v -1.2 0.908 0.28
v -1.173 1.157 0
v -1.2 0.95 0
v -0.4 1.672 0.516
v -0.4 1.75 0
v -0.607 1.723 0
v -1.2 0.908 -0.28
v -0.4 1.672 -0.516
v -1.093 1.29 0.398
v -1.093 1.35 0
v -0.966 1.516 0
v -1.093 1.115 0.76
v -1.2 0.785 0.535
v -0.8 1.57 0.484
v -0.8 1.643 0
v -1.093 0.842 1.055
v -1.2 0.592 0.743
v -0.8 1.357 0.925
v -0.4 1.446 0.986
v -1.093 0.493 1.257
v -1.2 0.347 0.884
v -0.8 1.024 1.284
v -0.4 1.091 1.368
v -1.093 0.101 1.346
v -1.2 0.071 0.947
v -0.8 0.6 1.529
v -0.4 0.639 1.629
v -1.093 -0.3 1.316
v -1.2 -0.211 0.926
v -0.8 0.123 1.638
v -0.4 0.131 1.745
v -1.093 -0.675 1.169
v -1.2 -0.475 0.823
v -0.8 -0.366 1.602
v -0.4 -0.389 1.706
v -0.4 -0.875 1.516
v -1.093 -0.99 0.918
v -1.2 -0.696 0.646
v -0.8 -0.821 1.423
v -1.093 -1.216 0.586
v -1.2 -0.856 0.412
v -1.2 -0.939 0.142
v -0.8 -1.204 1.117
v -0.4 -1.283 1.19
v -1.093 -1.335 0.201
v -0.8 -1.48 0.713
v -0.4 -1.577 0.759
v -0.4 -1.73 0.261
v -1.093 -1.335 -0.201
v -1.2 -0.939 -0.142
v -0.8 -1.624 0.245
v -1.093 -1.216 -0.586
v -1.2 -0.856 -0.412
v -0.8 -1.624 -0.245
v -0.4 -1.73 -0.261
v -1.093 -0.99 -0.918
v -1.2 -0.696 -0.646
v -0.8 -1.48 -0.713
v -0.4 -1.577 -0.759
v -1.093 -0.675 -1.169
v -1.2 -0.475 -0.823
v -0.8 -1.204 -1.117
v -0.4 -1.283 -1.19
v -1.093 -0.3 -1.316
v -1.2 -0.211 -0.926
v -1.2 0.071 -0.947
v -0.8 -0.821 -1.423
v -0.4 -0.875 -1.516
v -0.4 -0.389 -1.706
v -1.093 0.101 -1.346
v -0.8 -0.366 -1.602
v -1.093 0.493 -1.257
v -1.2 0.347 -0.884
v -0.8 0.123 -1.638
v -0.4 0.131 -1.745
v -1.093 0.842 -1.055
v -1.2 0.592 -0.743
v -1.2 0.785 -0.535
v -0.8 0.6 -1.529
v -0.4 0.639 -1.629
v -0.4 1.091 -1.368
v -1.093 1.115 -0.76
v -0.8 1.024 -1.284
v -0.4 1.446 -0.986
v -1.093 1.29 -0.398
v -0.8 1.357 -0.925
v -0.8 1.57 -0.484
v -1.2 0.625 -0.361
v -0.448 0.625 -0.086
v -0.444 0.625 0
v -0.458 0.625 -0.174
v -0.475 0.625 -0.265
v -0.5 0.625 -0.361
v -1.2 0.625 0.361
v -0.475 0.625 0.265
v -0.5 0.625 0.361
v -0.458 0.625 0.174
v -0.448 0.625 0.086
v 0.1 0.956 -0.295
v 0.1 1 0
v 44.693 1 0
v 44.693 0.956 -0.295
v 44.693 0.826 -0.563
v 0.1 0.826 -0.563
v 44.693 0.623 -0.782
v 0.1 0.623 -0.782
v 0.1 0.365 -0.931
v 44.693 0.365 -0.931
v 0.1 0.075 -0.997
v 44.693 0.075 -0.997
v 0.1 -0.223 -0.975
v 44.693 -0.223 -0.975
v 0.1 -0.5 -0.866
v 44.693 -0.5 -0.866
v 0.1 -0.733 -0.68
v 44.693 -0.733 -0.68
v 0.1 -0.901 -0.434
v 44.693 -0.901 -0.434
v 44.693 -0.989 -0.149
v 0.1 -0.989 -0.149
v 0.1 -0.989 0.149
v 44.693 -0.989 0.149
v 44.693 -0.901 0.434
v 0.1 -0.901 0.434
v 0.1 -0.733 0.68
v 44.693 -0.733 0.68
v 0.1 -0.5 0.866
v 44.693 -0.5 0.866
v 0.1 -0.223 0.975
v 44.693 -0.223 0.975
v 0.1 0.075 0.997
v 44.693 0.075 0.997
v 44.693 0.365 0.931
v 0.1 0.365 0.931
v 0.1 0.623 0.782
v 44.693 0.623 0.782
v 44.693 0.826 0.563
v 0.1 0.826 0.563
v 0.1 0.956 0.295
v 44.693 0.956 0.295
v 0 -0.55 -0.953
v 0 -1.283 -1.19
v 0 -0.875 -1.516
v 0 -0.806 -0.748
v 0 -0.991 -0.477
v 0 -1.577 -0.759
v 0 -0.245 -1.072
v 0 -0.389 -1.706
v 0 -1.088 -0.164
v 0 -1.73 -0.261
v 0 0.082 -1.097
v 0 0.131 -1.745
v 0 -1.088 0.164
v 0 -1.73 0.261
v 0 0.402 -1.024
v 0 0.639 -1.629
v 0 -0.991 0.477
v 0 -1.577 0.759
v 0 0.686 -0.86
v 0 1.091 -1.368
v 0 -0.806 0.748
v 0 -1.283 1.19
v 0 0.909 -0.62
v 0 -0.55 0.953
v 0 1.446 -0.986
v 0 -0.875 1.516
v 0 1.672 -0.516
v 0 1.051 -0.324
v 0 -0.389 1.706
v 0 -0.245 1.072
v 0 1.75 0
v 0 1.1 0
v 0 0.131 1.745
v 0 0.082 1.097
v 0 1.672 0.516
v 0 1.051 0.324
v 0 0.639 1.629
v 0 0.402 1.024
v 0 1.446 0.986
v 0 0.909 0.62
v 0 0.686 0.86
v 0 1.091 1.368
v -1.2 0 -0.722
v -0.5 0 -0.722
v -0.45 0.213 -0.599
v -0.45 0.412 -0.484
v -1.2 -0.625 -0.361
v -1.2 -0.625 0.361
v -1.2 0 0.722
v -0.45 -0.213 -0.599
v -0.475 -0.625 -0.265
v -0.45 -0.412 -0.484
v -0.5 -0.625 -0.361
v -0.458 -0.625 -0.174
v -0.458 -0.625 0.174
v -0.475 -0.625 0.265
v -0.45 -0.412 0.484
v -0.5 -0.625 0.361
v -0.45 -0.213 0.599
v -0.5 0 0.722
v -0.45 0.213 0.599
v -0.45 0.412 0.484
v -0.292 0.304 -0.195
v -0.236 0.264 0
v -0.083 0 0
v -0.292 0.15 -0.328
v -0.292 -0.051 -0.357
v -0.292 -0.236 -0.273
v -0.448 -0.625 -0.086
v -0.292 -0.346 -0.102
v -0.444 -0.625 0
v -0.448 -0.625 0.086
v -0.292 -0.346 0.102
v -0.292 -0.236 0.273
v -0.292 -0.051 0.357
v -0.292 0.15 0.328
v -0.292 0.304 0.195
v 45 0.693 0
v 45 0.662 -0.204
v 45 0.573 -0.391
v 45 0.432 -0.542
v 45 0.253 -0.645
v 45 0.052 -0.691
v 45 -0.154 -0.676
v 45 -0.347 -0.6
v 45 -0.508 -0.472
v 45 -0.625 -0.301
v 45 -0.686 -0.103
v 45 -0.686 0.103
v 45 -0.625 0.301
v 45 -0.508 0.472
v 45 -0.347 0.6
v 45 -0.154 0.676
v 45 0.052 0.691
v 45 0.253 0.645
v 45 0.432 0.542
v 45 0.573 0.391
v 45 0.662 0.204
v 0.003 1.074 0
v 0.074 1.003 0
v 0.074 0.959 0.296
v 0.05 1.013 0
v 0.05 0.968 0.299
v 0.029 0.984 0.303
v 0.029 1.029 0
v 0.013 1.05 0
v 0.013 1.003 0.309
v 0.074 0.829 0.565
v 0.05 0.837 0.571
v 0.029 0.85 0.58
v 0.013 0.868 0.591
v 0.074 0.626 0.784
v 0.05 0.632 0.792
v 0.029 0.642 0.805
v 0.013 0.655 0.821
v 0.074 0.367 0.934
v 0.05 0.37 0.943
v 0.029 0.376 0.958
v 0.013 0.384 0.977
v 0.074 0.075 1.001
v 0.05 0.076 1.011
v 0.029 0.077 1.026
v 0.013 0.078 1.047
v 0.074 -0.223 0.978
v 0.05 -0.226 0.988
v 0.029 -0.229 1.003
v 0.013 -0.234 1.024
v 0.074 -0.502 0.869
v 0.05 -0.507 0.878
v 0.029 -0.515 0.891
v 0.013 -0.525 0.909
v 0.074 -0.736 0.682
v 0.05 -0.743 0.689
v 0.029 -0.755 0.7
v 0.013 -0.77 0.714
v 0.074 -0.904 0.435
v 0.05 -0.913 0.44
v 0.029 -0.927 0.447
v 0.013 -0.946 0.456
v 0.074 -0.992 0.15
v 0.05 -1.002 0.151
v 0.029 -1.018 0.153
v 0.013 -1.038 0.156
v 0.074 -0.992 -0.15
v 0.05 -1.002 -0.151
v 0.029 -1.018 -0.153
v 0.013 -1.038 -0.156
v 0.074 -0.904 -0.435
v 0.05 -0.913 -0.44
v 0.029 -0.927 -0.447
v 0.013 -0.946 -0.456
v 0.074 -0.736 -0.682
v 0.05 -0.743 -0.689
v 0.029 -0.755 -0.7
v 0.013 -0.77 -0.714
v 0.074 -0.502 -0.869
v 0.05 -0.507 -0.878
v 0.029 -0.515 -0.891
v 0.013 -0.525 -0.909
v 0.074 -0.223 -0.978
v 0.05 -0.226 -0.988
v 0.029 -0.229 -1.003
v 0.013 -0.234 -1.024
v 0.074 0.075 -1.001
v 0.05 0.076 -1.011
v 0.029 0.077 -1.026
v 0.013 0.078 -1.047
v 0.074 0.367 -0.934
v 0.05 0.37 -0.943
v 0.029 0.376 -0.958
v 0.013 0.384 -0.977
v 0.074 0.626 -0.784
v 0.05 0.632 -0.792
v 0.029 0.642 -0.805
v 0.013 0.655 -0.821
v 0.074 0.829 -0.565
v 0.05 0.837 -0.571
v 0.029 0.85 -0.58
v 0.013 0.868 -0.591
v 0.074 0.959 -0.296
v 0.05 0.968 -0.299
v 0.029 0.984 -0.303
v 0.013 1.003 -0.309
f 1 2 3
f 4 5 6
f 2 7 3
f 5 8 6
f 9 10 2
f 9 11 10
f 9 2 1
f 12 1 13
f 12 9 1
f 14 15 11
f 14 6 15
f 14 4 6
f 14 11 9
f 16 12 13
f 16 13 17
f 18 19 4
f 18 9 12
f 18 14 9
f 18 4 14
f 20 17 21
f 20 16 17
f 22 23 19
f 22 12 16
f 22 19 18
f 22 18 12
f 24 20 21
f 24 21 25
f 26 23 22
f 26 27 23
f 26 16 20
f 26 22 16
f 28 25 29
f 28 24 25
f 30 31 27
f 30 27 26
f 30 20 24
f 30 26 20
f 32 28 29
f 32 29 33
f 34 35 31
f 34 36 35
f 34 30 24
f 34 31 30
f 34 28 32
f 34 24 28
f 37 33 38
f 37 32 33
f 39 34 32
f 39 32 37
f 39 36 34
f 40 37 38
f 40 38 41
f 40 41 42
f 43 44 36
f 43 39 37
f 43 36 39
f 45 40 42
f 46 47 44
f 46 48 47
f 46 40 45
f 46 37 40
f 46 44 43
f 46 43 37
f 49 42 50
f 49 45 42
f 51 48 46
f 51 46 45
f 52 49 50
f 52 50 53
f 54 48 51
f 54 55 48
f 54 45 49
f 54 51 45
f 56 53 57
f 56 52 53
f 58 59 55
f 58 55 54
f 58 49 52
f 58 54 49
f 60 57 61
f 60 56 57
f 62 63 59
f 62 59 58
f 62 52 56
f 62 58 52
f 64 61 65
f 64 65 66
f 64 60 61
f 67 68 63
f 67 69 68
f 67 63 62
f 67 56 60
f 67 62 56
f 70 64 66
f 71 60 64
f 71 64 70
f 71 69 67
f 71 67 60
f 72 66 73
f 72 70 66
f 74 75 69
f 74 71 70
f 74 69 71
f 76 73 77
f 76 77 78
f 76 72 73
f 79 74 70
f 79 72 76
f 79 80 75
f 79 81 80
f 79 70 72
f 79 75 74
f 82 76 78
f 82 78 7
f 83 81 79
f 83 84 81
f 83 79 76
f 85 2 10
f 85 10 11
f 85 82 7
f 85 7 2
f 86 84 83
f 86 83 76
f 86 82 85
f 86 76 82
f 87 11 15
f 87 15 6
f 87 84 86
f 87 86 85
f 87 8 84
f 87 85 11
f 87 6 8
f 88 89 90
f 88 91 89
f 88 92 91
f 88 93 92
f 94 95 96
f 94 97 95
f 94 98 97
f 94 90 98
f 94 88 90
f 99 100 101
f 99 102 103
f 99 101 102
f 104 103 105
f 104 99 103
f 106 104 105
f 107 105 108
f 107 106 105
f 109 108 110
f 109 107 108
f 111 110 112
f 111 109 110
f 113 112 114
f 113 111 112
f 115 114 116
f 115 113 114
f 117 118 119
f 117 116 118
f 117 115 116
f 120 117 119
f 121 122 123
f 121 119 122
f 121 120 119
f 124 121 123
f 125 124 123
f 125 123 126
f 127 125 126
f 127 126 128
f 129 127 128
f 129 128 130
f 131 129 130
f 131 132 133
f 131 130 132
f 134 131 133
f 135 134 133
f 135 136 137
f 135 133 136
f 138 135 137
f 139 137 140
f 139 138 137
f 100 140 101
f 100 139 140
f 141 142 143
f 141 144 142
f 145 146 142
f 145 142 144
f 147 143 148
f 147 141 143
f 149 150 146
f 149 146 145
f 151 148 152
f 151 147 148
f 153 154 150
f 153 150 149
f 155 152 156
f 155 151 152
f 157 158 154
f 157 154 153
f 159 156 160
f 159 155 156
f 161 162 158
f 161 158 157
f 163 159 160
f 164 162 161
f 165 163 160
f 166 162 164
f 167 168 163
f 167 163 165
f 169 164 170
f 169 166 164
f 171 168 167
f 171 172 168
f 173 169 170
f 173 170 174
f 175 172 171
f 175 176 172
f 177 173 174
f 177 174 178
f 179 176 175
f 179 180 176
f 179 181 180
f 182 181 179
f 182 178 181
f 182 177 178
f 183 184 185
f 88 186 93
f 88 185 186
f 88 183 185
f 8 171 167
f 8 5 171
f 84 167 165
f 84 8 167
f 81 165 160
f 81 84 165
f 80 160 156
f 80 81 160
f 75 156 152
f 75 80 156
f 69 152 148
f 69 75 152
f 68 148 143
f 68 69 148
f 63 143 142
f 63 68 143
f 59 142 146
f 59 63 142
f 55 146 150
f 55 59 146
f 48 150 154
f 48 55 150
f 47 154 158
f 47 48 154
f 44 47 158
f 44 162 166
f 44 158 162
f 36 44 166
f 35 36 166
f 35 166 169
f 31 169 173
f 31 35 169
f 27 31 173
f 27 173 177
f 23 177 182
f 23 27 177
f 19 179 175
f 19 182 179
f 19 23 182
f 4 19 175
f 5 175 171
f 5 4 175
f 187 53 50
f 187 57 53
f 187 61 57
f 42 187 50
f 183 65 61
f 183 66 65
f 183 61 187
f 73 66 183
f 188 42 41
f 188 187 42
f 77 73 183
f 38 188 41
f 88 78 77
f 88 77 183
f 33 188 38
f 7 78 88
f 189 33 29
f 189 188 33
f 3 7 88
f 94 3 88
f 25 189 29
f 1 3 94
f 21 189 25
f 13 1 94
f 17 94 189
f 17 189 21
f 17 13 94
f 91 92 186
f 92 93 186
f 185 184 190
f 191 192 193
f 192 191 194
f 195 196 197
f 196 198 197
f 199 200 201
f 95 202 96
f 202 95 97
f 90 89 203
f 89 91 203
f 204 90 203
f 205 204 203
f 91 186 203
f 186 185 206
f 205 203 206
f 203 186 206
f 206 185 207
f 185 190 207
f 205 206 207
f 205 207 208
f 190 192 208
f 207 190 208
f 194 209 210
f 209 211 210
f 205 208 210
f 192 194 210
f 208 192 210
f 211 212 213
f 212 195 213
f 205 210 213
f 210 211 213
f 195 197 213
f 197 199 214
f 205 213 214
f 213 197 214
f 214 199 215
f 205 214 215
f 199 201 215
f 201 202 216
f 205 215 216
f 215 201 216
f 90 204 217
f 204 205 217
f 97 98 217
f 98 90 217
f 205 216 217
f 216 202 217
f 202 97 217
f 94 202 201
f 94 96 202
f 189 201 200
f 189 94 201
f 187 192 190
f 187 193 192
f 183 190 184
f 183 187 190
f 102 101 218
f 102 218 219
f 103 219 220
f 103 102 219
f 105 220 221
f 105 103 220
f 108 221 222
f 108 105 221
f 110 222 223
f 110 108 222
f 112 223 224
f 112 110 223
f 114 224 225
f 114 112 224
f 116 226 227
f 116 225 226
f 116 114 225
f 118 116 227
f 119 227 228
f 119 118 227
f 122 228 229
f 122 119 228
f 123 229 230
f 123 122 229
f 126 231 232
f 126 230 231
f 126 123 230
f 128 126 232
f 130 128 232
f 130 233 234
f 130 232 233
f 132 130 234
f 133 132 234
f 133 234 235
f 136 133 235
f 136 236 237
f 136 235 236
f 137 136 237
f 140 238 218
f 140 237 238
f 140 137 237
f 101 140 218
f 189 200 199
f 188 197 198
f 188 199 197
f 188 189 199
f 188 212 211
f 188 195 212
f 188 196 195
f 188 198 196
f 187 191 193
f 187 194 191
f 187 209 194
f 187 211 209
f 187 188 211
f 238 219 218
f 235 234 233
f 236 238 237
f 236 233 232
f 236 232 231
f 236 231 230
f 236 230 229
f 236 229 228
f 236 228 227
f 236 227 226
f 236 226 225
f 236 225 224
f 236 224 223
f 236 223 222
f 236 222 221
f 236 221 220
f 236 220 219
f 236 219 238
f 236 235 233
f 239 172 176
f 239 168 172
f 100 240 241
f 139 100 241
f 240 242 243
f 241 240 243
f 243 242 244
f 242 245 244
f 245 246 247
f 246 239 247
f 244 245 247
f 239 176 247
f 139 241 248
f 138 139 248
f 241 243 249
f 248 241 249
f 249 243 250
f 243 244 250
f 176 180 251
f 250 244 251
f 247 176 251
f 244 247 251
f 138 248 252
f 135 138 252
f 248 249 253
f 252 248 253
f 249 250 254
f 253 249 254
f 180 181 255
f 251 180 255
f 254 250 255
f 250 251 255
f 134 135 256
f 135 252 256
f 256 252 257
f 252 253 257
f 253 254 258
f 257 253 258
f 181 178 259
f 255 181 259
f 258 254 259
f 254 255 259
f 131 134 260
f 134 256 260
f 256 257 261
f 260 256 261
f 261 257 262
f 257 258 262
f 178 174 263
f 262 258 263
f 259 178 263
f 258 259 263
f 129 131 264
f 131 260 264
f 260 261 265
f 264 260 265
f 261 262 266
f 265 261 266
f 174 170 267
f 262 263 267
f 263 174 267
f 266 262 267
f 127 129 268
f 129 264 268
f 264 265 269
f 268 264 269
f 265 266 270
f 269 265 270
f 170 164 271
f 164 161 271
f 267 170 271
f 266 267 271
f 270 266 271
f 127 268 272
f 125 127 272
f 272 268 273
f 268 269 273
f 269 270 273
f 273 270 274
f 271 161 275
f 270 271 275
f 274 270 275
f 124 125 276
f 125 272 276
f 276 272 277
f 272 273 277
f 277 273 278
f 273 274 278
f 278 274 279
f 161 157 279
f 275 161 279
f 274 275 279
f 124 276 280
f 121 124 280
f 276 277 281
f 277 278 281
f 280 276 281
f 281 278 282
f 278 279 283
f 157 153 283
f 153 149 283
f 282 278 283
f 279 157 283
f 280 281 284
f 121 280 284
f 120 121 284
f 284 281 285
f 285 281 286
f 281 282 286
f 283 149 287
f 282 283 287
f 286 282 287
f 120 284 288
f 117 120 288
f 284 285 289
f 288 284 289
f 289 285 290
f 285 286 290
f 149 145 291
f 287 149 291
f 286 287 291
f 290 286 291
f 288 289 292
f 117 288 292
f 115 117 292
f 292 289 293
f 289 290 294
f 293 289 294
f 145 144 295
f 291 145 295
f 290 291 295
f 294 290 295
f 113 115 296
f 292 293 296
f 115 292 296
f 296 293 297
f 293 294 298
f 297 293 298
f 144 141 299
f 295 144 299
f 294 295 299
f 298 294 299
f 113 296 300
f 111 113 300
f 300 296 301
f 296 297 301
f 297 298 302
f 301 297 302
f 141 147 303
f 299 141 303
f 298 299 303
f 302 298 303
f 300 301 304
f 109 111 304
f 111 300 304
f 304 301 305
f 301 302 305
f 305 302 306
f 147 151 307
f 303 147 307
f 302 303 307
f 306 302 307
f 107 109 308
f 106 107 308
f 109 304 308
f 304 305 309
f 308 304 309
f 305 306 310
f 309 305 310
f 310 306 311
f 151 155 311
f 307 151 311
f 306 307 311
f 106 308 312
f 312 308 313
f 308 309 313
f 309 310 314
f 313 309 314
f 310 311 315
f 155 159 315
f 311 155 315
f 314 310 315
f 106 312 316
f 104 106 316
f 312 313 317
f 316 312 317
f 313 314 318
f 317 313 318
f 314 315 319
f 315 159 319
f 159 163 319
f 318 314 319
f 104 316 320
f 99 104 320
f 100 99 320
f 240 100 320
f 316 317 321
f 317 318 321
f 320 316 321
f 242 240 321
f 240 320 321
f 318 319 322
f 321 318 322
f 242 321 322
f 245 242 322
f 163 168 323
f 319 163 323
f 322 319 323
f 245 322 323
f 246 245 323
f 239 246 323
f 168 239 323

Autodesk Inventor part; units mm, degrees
ref_plane "YZ Plane" through (0, 0, 0) normal (1, 0, 0) x (0, 1, 0)
ref_plane "XZ Plane" through (0, 0, 0) normal (0, 1, 0) x (-1, 0, 0)
sketch "Sketch1" plane through (0, 0, 0) normal (0, 0, 1) x (1, 0, 0)
  line L0 (-0.0833, 0) -> (45, 0)
  line L1 (45, 0) -> (45, 1)
  line L2 (45, 1) -> (42, 1)
  line L3 (42, 1) -> (41.6932, 1)
  line L4 (41.6932, 1) -> (0, 1)
  line L5 (0, 1) -> (0, 1.75)
  line L6 (0, 1.75) -> (-1.2, 1.75)
  line L7 (-1.2, 1.75) -> (-1.2, 0.7217)
  line L8 (-1.2, 0.7217) -> (-0.5, 0.7217)
  line L9 (-0.5, 0.7217) -> (-0.0833, 0)
  line L10 (-10.44, 0) -> (54.24, 0) projected
  line L11 (0, -0.35) -> (0, 2.1) projected
  line L12 (42, 1) -> (0, 1) construction
  dimension "d1" = 3
  dimension "d2" = 0.3068
  dimension "d3" = 1.2
  dimension "d4" = 0.7
  dimension "d5" = 60
  dimension "d6" = 2
  dimension "d7" = 2
  dimension "d8" = 1.4434
  dimension "d9" = 3.5
  dimension "d26" = 45
revolve "Body" add sketch "Sketch1" angle 360 about axis through (-0.0833, 0, 0) along (1, 0, 0)
sketch "Sketch2" plane through (-1.2, 0, 0) normal (-1, 0, 0) x (0, 0, 1)
  circle A0 centre (0, 0) radius 0.7217 projected
  line L0 (0, -2.45) -> (0, 2.45) projected
  line L1 (-2.45, 0) -> (2.45, 0) projected
  line L2 (0.7217, 0) -> (0.3608, -0.625)
  line L3 (0.3608, -0.625) -> (-0.3608, -0.625)
  line L4 (-0.3608, -0.625) -> (-0.7217, 0)
  line L5 (-0.7217, 0) -> (-0.3608, 0.625)
  line L6 (-0.3608, 0.625) -> (0.3608, 0.625)
  line L7 (0.3608, 0.625) -> (0.7217, 0)
extrude "Slot" add sketch "Sketch2" against normal up to next contours L7 A0 | A0 L2 | L6 L0 A0 | A0 L0 L3 | L0 L6 A0 | A0 L3 L0 | L4 A0 | A0 L5
fillet "Fillet1" radius 0.8 1 edges at (-1.2, -1.75, 0)
chamfer "Chamfer1" distance 0.3067 distance2 0.3067 1 edges at (45, -1, 0) measured on face at (45, -0.2495, -0.4023)
ref_plane "Work Plane1" through (29, 0, 0) normal (0, -1, 0) x (1, 0, 0)
fillet "Fillet2" radius 0.1 1 edges at (0, -1, 0)
thread "Thread2" size "M2x0.4" class "6g" standard "ANSI Metric M Profile" full length
equation "\"d15\" = -0.5 * SPD + 0.5 * GD"
equation "\"d16\" = GUL"
equation "\"GD\" = NND"
equation "\"NLG\" = 6"
equation "\"GEL\" = 4.5"
equation "\"KOD\" = 5.7"
equation "\"KOH\" = 1.65"
equation "\"INTI\" = 1.04"
equation "\"GAL\" = 0.61345 * PTC"
equation "\"GUL\" = 0.61345 * PTC"
equation "\"BDM\" = NND"
equation "\"SW\" = 2"
equation "\"RR\" = 1.45"
equation "\"SPD\" = NND - 1.2269 * PTC"
equation "\"R\" = 0.3"
equation "\"TOA\" = 30deg"
equation "\"GD1\" = THREADDIA - 1.2269 * PTC"
equation "\"THREADDIA\" = 3"
equation "\"PTC\" = 0.5"
equation "\"NND\" = 3"
equation "\"KOH1\" = 0.2"
equation "\"E0\" = 2.303"
properties part number "M2x35 Bolt" material "Stainless Steel"
